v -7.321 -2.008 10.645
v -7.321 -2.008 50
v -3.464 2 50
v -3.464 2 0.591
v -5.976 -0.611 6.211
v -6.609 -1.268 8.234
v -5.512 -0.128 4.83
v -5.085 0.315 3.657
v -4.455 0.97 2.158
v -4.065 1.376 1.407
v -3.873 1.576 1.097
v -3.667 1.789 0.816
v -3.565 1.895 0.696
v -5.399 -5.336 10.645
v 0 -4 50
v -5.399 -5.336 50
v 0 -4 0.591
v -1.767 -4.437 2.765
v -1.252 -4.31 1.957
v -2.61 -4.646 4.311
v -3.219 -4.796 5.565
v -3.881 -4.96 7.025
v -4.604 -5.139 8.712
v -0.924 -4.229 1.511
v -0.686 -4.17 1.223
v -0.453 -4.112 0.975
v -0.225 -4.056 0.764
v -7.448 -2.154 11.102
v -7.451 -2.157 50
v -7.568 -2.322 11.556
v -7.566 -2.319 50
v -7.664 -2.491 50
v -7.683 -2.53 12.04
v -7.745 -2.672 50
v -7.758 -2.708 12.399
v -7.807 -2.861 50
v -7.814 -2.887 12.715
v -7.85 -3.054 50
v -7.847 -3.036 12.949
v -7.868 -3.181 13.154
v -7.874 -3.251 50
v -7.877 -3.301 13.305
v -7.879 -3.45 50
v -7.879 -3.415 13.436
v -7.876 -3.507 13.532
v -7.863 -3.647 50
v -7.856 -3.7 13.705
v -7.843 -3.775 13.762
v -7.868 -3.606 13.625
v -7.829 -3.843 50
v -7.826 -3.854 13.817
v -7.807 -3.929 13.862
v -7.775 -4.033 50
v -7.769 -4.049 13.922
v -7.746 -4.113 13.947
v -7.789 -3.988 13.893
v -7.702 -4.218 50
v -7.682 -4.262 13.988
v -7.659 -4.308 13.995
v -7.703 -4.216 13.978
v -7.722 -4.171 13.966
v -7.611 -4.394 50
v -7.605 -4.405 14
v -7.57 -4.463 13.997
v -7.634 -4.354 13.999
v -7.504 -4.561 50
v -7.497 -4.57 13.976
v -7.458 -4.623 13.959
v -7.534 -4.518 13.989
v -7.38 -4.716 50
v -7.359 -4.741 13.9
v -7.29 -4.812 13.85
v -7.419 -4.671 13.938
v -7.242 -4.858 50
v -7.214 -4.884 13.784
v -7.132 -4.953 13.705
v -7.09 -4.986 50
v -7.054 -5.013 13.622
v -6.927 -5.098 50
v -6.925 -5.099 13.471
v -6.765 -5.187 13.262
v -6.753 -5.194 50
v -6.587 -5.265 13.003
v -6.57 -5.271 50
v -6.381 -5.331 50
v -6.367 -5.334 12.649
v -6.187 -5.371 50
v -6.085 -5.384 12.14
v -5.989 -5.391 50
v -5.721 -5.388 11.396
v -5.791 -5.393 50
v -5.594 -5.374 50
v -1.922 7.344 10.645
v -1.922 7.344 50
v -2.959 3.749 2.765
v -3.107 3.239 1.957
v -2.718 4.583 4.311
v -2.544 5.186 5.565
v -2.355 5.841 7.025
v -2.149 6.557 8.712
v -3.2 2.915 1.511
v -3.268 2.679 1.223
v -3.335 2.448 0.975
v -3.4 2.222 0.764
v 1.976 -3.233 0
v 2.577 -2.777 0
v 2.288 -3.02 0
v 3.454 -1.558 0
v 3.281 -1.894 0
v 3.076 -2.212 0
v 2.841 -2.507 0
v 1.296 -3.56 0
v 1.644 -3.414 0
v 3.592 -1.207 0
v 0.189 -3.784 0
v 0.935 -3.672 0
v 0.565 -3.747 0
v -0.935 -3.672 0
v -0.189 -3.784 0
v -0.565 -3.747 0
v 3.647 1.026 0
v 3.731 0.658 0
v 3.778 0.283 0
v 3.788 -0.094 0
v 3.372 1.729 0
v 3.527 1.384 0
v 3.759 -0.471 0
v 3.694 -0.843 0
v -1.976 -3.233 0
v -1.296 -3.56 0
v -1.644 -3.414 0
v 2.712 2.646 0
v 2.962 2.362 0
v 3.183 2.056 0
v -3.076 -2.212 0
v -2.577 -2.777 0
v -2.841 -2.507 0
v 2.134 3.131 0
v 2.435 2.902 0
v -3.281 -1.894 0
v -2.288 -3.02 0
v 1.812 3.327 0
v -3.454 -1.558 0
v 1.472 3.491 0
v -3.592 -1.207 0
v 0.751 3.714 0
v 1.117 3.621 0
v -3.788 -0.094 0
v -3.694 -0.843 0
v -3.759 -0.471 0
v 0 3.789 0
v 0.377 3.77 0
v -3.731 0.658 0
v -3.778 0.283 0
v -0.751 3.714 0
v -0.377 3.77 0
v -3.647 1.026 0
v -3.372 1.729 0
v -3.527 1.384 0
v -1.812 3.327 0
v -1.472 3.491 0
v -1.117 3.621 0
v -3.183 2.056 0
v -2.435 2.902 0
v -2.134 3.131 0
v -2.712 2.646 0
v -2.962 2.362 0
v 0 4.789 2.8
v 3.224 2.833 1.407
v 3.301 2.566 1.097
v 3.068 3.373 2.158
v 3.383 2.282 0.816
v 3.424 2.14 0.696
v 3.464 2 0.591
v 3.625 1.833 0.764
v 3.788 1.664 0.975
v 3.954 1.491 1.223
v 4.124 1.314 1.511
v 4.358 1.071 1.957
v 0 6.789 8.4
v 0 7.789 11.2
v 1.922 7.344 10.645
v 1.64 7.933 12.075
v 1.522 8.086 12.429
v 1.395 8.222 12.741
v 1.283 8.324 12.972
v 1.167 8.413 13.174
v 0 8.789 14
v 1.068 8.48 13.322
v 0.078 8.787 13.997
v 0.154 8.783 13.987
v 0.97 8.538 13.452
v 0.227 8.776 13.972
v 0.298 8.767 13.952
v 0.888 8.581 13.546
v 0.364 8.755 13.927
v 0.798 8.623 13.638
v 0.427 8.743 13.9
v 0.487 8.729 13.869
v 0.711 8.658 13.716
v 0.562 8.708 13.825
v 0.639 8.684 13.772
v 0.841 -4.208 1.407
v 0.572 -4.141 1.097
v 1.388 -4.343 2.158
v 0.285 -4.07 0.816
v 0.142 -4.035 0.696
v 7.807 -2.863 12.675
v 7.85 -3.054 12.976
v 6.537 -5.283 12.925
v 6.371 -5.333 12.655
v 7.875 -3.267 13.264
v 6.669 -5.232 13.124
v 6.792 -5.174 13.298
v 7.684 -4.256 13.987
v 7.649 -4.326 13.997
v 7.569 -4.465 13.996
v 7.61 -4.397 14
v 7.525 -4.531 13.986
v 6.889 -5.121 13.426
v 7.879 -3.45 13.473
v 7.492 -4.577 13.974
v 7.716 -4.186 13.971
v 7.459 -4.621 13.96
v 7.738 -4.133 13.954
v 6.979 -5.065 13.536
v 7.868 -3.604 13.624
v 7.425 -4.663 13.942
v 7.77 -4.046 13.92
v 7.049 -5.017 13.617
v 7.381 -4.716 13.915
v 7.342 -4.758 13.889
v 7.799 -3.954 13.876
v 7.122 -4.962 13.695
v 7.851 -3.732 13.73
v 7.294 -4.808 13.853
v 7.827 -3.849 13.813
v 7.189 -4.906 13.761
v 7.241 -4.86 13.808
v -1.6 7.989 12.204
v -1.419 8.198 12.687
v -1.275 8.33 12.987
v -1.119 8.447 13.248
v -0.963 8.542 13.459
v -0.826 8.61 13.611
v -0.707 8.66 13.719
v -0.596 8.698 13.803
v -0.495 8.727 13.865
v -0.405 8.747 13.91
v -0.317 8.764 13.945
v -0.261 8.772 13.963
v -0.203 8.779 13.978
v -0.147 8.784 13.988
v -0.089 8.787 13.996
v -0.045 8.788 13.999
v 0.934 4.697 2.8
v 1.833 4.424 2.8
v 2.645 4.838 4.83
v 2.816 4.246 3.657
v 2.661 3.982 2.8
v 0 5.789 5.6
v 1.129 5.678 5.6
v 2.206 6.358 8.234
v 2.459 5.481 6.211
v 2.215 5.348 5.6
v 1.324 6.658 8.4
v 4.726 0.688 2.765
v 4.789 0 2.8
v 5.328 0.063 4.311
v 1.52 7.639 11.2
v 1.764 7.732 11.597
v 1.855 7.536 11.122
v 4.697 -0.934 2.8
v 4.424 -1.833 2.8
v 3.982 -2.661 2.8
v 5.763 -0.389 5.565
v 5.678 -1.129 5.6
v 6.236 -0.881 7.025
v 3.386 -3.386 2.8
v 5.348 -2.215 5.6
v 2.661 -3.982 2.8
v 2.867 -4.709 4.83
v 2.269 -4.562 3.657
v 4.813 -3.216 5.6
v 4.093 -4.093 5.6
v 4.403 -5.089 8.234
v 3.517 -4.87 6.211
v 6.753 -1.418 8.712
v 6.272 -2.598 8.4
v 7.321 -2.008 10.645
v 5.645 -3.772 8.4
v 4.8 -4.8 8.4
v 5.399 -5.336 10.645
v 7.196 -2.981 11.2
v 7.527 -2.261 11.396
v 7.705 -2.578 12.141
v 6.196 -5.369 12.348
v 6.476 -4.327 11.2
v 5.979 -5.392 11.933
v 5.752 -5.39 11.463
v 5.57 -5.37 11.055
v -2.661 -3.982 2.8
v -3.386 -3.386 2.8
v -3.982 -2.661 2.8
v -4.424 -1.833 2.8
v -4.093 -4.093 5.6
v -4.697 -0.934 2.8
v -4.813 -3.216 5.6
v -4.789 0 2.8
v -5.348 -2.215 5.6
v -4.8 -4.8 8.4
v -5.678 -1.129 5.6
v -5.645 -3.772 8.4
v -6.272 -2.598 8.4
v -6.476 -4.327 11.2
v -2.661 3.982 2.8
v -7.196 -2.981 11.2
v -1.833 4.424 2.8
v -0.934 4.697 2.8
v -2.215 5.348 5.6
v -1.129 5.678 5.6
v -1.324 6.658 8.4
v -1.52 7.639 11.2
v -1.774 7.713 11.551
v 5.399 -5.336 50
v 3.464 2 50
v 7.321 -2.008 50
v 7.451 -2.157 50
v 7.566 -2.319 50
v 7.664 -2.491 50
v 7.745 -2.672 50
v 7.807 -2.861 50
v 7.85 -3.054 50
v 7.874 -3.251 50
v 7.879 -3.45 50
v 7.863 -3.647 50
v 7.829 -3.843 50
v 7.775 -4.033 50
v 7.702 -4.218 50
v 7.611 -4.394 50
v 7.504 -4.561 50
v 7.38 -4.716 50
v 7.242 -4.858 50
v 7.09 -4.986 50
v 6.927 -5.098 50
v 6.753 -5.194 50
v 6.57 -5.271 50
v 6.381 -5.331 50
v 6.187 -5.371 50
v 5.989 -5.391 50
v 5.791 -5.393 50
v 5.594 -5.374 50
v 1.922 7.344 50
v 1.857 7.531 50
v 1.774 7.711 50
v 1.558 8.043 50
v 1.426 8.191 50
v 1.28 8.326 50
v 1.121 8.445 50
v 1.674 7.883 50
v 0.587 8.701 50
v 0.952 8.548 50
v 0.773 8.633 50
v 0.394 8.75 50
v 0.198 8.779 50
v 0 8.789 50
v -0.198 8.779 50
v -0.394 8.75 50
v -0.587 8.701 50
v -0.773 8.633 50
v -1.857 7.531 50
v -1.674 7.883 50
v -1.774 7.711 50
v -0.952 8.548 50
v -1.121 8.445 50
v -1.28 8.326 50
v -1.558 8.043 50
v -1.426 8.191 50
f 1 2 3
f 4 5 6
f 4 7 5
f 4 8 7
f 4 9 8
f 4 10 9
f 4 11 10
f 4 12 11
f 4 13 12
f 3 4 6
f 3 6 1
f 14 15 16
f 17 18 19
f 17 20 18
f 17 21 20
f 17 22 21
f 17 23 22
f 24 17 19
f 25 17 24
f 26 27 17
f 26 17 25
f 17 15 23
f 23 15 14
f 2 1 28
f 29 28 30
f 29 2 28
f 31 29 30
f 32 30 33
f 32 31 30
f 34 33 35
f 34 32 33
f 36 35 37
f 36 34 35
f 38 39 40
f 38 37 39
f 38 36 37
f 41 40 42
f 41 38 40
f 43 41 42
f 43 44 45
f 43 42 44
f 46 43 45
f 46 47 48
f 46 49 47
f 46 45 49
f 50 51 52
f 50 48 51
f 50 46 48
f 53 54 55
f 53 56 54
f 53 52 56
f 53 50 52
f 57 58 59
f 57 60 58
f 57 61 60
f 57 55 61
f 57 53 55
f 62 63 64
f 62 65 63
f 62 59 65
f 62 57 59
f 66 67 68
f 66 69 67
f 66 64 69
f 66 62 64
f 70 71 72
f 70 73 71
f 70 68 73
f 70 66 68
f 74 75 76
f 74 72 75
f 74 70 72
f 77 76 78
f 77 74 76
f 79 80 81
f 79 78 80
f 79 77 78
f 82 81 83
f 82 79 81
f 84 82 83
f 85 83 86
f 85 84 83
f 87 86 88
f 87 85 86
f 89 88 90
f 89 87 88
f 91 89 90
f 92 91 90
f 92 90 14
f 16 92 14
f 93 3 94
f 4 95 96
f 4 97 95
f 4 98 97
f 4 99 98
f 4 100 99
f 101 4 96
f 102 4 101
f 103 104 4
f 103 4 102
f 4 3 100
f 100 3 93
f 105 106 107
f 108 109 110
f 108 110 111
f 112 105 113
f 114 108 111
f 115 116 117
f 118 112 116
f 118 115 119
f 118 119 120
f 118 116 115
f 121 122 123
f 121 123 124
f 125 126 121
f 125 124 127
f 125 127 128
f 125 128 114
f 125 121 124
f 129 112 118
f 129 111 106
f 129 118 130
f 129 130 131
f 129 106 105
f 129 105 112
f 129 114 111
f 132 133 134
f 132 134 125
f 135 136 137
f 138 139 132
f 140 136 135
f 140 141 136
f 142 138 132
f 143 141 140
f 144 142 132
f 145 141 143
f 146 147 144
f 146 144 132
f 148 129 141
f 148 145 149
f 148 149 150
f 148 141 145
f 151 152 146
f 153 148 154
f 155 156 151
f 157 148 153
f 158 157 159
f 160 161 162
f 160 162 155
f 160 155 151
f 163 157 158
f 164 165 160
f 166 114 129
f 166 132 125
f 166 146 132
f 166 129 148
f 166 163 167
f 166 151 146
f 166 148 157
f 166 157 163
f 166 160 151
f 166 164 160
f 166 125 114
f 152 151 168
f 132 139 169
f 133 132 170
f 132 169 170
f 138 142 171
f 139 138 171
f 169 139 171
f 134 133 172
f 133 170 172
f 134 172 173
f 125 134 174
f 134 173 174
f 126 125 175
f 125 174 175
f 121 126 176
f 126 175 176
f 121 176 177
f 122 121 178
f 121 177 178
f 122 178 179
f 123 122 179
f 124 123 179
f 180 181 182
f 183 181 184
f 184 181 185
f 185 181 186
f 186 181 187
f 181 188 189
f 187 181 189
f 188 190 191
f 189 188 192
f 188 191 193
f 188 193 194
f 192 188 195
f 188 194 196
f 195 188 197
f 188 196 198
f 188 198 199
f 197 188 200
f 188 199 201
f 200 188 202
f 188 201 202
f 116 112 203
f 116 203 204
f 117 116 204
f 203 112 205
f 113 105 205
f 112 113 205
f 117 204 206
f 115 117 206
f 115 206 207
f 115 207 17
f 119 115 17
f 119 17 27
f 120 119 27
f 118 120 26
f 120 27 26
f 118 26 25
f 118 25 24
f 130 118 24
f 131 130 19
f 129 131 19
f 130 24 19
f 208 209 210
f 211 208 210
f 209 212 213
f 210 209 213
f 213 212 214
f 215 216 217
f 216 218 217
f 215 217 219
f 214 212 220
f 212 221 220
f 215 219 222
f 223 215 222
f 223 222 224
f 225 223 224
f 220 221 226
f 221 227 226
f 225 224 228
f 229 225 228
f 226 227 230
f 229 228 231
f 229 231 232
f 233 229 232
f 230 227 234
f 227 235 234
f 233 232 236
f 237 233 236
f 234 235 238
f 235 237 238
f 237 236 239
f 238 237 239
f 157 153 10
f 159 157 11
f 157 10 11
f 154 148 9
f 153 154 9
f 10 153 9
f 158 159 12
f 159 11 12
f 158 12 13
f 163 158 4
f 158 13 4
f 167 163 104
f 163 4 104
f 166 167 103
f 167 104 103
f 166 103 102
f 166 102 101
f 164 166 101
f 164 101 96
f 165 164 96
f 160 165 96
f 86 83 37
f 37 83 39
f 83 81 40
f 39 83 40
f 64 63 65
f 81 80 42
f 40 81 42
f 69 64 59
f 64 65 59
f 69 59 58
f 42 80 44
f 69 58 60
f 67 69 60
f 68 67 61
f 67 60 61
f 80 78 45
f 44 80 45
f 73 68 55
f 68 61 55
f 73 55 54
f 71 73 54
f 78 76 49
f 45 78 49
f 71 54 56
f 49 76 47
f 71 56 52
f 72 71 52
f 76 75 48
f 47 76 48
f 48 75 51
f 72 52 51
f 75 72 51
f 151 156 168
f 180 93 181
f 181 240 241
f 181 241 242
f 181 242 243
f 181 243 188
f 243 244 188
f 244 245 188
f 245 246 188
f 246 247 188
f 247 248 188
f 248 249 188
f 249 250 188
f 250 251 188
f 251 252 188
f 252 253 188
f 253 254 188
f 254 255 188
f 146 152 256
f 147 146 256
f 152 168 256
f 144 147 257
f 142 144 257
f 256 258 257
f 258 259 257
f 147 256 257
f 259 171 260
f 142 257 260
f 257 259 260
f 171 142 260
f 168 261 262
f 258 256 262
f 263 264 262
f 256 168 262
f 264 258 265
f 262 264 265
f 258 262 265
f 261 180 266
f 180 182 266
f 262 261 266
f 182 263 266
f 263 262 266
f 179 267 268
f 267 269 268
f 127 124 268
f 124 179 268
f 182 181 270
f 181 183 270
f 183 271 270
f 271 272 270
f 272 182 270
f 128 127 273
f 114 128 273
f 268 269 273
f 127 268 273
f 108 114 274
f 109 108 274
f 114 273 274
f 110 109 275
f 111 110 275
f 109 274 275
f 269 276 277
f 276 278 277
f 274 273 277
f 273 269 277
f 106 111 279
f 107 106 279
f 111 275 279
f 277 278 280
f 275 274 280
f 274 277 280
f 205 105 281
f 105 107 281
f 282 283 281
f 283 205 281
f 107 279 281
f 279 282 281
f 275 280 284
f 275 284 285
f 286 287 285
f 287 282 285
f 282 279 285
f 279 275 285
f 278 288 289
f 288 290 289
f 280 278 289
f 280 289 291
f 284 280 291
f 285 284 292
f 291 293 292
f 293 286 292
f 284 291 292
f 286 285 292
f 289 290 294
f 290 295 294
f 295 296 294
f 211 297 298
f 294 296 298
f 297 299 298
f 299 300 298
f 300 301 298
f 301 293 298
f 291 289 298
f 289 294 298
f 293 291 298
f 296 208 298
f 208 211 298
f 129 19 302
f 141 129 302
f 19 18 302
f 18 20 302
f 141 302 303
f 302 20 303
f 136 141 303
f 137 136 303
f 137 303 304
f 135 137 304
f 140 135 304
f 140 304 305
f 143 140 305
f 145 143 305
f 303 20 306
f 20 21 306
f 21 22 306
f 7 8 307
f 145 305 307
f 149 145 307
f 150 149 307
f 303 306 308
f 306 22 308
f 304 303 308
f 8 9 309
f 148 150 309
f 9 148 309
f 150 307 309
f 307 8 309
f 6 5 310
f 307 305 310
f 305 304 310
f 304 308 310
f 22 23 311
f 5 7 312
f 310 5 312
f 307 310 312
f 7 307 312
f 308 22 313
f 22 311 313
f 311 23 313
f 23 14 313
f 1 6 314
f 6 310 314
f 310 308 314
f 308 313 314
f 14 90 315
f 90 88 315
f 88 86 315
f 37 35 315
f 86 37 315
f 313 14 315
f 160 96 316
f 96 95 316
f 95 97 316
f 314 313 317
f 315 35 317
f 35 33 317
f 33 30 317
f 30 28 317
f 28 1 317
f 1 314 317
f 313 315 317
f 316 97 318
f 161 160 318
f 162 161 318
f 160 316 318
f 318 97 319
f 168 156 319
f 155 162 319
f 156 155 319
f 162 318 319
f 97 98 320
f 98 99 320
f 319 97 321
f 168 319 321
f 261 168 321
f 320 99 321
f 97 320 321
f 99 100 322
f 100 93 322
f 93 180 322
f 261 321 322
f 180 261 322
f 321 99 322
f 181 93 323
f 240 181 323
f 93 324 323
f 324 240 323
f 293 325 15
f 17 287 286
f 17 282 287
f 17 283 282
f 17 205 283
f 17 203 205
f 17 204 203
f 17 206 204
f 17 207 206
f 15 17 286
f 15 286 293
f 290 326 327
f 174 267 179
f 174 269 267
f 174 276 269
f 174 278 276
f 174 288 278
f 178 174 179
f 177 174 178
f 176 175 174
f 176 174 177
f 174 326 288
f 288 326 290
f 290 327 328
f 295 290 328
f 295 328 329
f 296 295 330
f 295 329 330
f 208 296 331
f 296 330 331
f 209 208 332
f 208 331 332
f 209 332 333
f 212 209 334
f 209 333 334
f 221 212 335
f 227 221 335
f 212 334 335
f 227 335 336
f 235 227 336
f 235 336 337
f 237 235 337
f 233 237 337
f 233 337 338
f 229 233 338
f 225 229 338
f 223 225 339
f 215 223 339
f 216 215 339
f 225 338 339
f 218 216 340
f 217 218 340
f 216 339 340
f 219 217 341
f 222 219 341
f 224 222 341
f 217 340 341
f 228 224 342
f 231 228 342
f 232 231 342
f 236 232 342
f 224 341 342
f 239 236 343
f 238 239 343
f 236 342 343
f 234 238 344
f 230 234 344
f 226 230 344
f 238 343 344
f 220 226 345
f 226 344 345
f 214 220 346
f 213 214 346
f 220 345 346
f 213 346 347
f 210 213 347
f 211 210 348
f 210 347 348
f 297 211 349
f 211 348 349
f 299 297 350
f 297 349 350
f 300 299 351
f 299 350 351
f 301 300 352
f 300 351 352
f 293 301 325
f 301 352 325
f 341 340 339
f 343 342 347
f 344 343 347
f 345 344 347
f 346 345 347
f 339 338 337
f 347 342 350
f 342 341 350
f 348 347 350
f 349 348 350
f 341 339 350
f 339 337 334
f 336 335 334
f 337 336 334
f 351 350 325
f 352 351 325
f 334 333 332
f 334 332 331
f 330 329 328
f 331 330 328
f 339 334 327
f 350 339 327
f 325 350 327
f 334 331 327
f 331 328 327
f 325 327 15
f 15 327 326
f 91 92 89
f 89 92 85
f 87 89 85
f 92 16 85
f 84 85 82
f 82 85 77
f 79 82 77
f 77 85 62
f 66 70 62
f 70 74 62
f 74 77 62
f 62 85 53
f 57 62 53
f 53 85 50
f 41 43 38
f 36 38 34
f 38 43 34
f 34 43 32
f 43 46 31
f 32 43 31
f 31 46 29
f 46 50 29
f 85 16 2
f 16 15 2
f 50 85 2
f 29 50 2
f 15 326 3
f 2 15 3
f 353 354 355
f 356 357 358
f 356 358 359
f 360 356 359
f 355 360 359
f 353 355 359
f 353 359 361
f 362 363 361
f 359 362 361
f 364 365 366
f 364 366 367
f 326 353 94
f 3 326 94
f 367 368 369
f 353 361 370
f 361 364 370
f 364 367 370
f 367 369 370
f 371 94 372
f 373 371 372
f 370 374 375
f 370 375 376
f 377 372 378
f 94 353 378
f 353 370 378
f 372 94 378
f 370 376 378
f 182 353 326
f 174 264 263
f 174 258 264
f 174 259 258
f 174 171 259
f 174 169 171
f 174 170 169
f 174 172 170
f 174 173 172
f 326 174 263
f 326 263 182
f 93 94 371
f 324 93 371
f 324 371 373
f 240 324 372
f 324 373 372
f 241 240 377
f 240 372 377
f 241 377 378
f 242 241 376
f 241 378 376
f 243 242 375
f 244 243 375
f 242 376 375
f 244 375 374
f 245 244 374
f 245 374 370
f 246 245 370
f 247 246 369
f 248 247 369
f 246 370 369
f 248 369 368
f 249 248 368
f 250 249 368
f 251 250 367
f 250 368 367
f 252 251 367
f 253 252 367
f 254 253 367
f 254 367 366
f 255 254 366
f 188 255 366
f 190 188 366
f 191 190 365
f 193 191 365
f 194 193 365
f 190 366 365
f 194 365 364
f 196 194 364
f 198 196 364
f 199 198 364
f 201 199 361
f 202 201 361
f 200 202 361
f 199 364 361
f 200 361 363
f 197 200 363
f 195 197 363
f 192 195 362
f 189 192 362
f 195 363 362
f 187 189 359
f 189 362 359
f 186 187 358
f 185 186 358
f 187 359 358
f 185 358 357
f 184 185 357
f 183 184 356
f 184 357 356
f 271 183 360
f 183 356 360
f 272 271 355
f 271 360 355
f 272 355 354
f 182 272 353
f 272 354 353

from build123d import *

# Parameters (mm, degrees)
BOSS_EXTRUDE1_DEPTH = 50
FILLET1_R           = 2


with BuildPart() as part:
    # Sketch1 → Boss-Extrude1 (new body)
    with BuildSketch(Plane.XY):
        Polygon((-12.124355653, -7), (-3.464101615, 2), (0, 14), (3.464101615, 2), (12.124355653, -7), (0, -4), align=None)
    extrude(amount=BOSS_EXTRUDE1_DEPTH)

    # Fillet1
    fillet1_edges = [part.edges().sort_by_distance(p)[0] for p in [
        (-12.124355653, -7, 25),
        (0, 14, 25),
        (12.124355653, -7, 25),
    ]]
    fillet(fillet1_edges, radius=FILLET1_R)

    # Sketch2 → Cut-Revolve1 (revolve, cut)
    with BuildSketch(Plane(origin=(0, 0, 0), x_dir=(0, 0, -1), z_dir=(1, 0, 0))):
        Polygon((0, 8.788897449), (0, 3.788897449), (-14, 8.788897449), align=None)
    revolve(axis=Axis((0, 0, 0), (0, 0, -1)), mode=Mode.SUBTRACT)


solid = part.part
